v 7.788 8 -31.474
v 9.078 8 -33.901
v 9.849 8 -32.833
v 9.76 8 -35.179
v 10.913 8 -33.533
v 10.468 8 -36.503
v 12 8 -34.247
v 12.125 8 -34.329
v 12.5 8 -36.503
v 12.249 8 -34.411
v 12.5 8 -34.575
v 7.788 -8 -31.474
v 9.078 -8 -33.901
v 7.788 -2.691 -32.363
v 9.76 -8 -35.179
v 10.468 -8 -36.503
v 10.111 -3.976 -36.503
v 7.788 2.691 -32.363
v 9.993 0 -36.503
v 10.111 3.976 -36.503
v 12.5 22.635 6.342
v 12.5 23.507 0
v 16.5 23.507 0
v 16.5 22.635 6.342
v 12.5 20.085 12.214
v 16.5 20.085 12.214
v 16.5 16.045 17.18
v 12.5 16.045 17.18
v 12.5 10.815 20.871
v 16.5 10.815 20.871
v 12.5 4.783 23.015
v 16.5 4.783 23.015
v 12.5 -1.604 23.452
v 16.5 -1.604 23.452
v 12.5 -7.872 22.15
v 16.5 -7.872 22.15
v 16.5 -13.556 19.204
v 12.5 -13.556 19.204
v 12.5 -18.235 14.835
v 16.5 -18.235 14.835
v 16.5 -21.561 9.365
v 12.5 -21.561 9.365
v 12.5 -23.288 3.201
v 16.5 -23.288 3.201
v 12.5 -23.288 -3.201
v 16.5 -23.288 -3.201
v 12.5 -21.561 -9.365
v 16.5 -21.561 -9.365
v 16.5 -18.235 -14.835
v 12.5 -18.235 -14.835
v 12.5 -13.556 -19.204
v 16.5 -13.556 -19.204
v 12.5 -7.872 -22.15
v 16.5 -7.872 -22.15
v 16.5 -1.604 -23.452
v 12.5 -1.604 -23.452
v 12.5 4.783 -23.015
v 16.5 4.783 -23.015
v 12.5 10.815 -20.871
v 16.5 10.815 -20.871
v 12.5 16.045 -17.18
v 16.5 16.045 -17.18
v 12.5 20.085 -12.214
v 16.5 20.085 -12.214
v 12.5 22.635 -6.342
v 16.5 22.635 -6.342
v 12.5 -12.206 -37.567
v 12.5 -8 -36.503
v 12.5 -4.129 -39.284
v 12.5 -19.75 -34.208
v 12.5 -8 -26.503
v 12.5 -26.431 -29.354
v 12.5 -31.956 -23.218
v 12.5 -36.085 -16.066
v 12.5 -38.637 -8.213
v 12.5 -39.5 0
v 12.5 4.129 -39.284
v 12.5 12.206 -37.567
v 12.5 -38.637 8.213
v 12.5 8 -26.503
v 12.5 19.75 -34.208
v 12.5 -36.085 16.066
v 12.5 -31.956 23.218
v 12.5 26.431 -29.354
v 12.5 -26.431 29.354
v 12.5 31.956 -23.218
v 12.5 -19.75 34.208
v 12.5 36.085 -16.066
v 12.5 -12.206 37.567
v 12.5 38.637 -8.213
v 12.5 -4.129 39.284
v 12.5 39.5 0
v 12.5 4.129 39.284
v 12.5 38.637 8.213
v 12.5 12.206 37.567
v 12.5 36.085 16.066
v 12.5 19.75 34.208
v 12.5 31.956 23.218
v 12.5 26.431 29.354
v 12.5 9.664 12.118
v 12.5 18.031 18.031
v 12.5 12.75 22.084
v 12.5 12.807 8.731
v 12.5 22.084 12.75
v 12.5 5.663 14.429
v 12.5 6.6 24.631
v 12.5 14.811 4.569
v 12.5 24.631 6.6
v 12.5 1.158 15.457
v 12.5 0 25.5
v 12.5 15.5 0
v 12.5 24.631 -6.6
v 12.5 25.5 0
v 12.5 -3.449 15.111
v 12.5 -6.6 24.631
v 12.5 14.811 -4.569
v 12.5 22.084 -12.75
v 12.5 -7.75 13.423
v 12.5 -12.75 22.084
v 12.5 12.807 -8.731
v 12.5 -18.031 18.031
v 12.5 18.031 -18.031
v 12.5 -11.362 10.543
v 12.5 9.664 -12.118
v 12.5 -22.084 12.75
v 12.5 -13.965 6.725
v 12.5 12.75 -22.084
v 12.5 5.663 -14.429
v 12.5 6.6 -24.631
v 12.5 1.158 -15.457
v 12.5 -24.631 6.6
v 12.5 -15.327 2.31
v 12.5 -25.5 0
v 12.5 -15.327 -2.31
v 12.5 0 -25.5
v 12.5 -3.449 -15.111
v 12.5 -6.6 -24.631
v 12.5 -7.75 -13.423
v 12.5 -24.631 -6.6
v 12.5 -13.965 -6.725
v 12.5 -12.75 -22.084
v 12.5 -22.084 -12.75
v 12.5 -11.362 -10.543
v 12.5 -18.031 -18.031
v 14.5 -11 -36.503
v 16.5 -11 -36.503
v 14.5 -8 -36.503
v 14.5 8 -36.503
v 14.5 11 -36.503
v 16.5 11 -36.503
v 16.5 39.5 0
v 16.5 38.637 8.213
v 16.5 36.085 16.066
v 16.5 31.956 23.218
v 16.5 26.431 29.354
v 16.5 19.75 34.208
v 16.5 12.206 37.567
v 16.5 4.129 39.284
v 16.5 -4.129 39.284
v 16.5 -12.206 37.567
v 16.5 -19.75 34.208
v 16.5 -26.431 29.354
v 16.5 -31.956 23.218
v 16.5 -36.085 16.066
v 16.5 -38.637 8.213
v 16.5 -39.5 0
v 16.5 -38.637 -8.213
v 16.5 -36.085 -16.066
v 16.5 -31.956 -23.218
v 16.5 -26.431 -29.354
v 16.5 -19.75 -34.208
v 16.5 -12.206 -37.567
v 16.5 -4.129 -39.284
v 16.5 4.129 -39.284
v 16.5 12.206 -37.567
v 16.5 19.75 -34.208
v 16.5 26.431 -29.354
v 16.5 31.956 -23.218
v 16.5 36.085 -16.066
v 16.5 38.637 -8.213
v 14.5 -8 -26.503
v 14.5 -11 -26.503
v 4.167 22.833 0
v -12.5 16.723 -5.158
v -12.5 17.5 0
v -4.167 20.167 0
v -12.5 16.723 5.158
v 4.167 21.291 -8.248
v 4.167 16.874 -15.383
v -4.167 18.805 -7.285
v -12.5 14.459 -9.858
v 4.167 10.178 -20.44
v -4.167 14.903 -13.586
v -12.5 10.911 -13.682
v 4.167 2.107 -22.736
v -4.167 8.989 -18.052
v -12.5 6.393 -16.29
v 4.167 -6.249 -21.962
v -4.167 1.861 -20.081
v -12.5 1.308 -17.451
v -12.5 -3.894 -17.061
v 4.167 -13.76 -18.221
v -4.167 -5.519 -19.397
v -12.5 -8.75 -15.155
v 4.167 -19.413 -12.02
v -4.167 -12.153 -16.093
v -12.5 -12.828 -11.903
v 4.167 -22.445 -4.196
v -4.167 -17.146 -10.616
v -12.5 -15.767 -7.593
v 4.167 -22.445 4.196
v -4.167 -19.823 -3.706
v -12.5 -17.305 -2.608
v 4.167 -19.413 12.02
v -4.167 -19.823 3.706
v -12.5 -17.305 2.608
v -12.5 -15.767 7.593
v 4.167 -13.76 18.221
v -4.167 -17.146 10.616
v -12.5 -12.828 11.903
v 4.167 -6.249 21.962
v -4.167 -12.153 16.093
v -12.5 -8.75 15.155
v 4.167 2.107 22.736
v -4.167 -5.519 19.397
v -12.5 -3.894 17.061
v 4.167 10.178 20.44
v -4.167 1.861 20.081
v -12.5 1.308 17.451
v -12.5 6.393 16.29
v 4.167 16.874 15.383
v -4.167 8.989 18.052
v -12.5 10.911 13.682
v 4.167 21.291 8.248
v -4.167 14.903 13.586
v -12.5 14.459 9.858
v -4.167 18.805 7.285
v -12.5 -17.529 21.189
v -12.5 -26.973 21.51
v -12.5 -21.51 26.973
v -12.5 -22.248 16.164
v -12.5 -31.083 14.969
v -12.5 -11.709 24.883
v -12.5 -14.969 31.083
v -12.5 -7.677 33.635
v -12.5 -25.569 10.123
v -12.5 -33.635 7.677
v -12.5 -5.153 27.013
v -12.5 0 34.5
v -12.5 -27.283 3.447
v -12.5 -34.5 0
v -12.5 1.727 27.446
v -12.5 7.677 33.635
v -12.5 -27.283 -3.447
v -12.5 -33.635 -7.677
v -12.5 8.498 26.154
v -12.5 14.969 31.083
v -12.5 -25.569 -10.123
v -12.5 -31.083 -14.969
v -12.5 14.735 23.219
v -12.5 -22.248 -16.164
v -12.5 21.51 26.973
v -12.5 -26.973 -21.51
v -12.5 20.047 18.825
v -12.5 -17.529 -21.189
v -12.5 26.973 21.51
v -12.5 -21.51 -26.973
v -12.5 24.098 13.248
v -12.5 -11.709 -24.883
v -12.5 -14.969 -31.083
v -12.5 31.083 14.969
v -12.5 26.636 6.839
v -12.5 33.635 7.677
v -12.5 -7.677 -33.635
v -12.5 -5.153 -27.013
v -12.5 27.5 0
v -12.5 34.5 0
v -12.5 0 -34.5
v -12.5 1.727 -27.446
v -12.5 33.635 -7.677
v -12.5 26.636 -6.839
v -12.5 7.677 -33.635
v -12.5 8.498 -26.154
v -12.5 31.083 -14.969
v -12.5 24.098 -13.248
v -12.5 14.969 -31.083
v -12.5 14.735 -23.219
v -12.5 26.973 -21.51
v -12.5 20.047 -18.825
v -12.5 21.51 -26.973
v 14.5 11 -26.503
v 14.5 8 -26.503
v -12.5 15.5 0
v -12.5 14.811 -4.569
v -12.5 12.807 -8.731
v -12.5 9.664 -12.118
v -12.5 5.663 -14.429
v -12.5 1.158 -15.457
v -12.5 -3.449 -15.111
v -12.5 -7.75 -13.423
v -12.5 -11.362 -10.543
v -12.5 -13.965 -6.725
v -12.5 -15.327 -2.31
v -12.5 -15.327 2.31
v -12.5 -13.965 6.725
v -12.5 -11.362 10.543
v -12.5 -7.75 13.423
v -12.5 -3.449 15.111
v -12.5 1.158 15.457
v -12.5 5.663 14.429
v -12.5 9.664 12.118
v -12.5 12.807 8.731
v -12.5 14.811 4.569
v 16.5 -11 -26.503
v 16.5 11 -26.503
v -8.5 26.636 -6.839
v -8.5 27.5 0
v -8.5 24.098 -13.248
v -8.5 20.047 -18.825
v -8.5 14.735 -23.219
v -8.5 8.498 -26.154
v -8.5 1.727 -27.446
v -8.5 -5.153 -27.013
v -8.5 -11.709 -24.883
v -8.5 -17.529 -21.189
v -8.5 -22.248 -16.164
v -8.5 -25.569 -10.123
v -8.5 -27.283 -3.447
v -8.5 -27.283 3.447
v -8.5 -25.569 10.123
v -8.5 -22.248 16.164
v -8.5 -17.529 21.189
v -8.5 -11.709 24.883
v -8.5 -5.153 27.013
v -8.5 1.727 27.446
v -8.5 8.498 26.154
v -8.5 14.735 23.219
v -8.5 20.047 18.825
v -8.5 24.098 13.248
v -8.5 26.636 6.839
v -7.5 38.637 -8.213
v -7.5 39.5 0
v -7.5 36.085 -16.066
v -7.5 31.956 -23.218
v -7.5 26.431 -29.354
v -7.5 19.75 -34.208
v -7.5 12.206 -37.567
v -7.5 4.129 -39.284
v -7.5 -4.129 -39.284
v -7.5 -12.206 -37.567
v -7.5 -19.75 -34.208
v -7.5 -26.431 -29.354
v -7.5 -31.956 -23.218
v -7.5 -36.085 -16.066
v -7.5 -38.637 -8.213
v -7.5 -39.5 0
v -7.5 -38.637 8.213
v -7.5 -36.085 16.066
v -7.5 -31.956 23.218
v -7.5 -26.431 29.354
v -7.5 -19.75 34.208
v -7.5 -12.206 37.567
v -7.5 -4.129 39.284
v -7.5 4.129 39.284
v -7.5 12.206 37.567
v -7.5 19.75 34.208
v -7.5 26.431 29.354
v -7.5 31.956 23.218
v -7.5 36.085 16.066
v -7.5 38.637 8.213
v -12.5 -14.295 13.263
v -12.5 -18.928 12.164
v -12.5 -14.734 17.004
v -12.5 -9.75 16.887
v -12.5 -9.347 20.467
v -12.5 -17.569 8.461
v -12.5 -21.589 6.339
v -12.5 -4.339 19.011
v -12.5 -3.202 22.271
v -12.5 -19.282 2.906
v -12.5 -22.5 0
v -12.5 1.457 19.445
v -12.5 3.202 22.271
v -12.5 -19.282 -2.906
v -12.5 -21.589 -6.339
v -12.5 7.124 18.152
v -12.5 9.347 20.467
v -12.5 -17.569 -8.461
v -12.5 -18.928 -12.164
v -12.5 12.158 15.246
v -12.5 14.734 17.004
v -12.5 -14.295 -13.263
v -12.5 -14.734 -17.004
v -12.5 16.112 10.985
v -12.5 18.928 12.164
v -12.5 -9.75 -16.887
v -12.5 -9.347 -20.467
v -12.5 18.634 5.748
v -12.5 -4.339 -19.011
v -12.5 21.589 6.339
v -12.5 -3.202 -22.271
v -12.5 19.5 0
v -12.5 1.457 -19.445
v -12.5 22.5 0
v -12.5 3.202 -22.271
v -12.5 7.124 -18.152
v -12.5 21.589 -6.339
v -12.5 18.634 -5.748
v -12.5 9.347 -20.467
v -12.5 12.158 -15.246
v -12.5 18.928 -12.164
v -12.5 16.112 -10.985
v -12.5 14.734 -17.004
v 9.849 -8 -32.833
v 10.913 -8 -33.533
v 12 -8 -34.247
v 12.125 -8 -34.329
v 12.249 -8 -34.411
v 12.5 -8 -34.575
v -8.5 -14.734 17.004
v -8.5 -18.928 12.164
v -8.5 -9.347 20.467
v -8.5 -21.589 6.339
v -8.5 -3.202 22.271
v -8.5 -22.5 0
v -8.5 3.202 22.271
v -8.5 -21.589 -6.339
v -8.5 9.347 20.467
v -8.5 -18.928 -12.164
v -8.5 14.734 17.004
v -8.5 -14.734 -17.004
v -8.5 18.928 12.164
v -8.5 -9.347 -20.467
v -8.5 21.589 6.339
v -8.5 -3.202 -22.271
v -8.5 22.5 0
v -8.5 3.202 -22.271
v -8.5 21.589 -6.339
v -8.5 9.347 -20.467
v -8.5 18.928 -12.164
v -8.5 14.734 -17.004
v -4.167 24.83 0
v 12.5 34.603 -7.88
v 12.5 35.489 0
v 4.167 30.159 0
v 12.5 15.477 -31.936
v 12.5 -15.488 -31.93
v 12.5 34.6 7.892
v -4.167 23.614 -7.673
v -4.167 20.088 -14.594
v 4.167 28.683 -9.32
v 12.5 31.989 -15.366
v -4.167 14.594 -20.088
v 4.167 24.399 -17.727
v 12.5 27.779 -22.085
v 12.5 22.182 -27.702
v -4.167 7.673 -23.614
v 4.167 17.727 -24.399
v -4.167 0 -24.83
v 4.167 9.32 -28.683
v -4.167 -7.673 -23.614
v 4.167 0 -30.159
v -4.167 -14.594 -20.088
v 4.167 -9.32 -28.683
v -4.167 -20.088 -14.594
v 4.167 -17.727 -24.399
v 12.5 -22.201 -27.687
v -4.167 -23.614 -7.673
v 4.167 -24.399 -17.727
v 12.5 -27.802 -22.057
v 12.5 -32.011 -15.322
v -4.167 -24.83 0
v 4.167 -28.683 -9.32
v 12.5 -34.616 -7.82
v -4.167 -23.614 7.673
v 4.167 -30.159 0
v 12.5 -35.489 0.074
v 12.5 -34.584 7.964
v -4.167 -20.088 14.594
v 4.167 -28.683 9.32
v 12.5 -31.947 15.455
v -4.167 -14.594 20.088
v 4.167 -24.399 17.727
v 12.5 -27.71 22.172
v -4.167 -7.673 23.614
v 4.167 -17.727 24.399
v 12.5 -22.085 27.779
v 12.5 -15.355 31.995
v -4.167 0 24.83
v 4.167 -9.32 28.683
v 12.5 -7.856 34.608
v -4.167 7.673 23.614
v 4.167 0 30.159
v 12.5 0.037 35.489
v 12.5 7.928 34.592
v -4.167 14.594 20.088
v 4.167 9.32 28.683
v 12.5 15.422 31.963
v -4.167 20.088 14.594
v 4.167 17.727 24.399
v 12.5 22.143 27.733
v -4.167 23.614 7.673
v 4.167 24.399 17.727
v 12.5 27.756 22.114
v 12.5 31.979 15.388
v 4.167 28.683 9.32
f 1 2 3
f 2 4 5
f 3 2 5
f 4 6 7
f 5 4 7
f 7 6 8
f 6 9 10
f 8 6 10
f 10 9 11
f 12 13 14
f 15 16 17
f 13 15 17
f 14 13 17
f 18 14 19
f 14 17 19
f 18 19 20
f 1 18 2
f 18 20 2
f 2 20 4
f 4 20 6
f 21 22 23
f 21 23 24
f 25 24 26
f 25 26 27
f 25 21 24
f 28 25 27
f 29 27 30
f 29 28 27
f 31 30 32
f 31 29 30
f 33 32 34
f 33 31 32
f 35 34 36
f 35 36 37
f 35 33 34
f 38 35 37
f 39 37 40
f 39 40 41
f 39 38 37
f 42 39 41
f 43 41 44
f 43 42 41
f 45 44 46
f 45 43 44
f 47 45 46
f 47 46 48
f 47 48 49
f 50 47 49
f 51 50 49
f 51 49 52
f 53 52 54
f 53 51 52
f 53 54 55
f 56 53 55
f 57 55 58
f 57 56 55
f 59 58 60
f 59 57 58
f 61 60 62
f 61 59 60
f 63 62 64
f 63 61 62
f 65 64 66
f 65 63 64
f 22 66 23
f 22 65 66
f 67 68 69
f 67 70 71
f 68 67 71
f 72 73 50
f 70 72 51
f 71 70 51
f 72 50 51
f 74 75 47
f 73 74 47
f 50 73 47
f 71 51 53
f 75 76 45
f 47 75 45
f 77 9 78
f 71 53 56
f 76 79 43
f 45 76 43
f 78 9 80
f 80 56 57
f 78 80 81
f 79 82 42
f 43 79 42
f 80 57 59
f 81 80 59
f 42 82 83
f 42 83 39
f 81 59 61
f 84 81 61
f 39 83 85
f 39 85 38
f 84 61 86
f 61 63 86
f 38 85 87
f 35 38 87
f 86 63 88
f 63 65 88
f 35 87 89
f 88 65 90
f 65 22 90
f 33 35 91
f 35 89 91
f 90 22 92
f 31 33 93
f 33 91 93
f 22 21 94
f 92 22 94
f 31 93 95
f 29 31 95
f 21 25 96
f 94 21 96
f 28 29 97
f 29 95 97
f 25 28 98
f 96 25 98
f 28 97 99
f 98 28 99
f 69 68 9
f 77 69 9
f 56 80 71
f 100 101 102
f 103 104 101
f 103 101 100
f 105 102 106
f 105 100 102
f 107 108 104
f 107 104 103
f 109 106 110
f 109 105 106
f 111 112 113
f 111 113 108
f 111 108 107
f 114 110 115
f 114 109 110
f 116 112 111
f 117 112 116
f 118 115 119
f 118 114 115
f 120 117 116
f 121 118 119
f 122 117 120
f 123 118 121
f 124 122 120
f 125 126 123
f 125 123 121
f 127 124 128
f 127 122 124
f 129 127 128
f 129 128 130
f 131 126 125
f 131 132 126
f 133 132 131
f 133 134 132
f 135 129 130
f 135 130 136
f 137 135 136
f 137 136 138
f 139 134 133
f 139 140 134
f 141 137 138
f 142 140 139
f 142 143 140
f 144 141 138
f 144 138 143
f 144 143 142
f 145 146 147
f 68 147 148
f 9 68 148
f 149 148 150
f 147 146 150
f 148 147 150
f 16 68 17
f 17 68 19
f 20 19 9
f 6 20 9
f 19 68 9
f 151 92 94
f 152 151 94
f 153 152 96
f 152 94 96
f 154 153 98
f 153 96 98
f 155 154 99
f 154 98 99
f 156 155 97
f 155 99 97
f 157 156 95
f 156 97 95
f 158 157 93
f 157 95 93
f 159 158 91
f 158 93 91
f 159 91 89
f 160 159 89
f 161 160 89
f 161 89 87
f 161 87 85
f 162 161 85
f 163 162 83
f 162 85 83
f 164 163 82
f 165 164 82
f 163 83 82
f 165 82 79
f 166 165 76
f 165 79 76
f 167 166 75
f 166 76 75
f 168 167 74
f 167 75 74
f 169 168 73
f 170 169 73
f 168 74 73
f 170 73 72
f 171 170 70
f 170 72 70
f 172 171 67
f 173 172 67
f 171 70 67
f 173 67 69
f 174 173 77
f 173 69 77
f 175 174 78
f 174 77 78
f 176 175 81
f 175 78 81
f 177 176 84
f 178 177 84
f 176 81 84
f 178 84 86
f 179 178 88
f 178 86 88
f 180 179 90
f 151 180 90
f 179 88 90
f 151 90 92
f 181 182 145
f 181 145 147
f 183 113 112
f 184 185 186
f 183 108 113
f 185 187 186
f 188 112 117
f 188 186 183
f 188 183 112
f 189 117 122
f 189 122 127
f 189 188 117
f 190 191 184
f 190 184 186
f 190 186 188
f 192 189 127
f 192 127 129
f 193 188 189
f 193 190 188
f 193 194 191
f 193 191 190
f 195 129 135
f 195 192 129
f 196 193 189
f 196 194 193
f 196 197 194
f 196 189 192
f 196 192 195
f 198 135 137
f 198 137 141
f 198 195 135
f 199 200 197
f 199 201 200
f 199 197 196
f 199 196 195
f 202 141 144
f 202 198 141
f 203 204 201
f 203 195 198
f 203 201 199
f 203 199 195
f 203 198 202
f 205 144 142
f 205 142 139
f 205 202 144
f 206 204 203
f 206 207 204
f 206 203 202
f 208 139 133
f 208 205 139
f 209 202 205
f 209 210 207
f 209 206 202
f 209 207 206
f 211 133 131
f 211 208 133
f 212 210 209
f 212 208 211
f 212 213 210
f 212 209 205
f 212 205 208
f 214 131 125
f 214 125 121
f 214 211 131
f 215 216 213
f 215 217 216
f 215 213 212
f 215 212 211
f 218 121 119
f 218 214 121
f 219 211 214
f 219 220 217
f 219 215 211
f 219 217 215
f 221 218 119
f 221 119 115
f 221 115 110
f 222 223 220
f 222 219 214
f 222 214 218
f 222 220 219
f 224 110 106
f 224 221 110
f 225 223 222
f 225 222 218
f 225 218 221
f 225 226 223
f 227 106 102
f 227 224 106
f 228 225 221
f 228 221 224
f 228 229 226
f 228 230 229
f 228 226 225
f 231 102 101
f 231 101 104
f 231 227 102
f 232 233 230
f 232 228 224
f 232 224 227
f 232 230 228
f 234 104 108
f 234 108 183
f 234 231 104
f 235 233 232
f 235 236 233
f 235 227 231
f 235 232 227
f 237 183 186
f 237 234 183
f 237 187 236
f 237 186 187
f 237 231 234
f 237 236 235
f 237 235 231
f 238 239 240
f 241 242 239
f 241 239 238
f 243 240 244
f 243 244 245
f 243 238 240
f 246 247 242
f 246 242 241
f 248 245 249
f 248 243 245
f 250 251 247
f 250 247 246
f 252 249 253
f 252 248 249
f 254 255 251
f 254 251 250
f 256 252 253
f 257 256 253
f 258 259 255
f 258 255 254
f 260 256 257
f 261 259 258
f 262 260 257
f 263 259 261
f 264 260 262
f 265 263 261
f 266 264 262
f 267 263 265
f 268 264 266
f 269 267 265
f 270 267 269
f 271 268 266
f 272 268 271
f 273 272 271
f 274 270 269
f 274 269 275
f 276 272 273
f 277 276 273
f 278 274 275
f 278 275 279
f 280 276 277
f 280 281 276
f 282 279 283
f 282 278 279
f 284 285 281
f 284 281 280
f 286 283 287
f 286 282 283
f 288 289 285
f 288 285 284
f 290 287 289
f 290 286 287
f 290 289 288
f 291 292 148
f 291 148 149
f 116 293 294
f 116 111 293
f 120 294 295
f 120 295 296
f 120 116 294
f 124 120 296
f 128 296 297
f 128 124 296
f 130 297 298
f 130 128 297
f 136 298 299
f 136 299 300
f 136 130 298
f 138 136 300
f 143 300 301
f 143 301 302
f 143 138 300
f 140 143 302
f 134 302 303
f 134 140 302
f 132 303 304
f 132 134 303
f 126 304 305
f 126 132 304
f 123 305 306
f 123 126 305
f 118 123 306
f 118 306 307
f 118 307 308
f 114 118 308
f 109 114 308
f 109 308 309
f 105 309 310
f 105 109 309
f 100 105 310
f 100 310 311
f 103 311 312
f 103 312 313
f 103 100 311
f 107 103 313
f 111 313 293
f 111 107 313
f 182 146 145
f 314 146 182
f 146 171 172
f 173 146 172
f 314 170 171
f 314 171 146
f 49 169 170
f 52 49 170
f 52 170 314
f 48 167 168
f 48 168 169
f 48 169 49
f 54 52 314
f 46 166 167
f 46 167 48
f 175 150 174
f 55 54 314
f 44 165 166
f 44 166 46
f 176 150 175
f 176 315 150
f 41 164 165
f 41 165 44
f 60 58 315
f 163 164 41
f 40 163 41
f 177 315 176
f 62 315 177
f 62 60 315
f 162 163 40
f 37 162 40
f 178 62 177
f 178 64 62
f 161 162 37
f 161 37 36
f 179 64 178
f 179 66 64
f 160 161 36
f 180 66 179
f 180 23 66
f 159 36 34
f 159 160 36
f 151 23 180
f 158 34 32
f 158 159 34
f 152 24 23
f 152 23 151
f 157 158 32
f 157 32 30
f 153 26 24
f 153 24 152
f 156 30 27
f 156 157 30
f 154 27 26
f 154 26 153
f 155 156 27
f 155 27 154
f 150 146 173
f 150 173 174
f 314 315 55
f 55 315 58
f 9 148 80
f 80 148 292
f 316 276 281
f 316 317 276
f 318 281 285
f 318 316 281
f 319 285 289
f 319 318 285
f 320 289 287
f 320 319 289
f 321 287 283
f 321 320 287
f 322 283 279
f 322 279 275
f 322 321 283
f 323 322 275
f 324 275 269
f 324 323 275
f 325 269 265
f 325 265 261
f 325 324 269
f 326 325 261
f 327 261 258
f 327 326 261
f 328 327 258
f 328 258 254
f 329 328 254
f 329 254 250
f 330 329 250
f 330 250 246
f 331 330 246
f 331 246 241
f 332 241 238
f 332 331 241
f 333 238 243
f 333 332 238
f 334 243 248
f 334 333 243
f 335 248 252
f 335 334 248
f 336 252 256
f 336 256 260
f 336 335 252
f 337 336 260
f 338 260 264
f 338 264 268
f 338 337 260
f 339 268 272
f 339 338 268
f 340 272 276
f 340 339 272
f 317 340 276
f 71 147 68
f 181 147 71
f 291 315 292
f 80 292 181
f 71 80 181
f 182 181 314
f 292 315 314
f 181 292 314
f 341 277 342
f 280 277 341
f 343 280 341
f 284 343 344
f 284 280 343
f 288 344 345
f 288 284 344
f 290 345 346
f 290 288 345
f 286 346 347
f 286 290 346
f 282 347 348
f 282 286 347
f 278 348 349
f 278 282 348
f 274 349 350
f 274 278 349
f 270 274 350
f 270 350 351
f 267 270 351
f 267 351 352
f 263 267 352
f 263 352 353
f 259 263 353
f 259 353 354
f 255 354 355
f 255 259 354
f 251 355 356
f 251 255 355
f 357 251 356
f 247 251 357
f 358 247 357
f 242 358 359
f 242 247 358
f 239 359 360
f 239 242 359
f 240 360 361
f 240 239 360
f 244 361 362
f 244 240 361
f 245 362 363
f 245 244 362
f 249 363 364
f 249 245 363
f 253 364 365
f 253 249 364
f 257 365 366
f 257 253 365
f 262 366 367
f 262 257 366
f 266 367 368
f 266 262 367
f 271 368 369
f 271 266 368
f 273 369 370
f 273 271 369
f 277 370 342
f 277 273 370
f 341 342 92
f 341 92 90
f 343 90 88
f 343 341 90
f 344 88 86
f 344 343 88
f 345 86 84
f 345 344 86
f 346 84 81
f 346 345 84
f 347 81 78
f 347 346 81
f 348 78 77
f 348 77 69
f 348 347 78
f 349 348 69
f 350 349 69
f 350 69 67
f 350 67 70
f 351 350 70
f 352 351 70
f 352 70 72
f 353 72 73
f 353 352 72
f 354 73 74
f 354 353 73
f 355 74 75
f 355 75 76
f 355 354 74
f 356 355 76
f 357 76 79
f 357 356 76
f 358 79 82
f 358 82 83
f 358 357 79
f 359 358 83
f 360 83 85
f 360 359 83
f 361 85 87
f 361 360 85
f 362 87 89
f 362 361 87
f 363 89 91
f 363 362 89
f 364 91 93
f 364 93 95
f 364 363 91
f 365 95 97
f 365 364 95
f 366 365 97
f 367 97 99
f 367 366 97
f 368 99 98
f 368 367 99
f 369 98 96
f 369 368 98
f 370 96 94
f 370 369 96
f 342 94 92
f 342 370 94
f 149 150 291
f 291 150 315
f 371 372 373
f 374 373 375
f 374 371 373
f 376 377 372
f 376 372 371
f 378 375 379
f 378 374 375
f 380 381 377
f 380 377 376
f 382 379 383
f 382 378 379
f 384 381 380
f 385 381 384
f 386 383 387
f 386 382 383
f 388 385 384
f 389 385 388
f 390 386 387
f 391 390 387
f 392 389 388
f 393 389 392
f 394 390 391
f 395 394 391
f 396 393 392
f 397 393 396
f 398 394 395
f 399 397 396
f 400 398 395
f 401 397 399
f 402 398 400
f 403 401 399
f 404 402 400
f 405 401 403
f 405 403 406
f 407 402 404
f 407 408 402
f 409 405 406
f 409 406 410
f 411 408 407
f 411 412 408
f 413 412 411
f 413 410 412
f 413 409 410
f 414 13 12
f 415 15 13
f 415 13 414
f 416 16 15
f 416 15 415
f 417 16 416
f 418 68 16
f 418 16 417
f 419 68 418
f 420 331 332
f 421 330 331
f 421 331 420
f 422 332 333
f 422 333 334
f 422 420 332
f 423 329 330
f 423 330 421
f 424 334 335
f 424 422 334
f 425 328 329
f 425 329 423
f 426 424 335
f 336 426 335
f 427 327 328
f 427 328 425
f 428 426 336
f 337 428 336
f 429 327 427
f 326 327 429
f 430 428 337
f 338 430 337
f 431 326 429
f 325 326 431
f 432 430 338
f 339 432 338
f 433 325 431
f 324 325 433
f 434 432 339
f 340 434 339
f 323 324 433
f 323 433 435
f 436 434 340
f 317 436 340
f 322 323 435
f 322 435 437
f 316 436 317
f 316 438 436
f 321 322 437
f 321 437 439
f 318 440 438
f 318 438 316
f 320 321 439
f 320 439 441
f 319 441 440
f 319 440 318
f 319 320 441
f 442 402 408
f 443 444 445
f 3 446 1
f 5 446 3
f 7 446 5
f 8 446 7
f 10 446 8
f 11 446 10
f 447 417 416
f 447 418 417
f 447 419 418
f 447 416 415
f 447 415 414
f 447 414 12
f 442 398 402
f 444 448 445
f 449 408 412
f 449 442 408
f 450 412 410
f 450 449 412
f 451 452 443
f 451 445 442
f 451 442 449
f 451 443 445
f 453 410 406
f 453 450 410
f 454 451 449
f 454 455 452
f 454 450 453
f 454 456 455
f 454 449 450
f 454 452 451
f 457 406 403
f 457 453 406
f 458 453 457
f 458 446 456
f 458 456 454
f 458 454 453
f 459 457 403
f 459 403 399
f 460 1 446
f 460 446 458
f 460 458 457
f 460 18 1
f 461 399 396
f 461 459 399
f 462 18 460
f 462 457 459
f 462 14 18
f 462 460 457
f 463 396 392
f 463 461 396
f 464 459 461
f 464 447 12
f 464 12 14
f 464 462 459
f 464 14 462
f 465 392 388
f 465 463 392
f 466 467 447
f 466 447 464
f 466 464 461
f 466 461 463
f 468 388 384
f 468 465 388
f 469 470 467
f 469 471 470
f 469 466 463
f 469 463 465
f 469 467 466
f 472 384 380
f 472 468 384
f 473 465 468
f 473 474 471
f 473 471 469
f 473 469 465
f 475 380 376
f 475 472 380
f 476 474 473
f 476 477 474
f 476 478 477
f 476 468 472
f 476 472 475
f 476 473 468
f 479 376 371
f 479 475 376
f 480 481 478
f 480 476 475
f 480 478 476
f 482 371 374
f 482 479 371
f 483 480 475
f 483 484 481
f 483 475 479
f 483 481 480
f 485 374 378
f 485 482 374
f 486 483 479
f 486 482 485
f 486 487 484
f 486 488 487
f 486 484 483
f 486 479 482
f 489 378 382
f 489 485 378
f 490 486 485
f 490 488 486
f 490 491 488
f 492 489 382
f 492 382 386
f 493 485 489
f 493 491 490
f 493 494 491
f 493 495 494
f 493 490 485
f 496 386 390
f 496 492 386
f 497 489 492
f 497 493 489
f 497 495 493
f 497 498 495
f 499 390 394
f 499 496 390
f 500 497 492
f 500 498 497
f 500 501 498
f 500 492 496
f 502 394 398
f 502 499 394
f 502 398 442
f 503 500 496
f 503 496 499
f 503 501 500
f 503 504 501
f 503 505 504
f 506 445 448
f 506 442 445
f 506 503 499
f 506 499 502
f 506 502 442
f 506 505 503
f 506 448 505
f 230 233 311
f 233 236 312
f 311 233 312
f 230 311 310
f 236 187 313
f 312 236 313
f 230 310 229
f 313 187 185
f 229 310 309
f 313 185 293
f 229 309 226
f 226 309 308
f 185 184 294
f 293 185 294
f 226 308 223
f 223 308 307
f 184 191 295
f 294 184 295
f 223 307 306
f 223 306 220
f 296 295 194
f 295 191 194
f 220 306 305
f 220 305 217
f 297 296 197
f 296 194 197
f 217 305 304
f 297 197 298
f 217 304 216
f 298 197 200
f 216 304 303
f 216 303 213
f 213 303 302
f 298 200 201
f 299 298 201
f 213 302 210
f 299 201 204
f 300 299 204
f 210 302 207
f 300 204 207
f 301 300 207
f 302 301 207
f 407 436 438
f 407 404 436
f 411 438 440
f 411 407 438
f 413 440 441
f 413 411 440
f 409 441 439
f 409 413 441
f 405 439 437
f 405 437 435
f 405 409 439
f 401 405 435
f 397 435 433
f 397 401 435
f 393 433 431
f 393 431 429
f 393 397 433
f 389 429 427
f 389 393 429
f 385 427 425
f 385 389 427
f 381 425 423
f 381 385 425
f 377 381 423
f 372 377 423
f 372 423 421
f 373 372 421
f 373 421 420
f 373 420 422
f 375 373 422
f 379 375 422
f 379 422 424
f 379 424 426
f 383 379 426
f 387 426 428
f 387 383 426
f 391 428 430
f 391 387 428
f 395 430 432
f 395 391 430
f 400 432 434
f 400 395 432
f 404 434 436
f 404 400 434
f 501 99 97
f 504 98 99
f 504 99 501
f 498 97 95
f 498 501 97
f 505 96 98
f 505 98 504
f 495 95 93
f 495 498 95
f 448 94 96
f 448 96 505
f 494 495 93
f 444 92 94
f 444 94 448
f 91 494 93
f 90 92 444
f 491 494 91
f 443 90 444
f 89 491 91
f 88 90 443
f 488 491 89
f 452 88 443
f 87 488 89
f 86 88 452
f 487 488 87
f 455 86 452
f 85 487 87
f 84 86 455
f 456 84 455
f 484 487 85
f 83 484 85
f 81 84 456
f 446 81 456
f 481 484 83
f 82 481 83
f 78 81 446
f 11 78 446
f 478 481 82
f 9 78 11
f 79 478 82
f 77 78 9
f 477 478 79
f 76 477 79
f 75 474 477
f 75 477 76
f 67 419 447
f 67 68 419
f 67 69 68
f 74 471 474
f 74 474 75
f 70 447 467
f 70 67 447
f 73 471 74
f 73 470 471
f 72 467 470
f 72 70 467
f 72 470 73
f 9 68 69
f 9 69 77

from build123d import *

# Parameters (mm, degrees)
F0_W        = 25
F0_H        = 2
F2_SIZE     = 5
F3_R        = 39.5
F3_R_2      = 23.5068353711
F4_DEPTH    = 4
F5_W        = 8
F5_H        = 10
F6_DEPTH    = 4.5
F5_W_2      = 3
F7_DEPTH    = 2
F8_T4_ANGLE = 68.4635032376


# Not quite as in the source:
# - a fillet or chamfer that OpenCascade refuses, or shapes differently, is made with other operations: its cross-section is extruded or revolved along the edge and cut away or added


with BuildPart() as f1:
    # F0 (on Top) → F1 (revolve)
    with BuildSketch(Plane.XY):
        with Locations((0, 16.5)):
            Rectangle(F0_W, F0_H)
        Polygon((12.5, 25.5), (-12.5, 17.5), (12.5, 17.5), align=None)
    revolve(axis=Axis((0, 0, 0), (-1, 0, 0)))


with BuildPart() as f1b:
    # F0 (on Top) → F1, piece 2 (revolve)
    with BuildSketch(Plane.XY):
        Polygon((-12.5, 22.5), (-12.5, 19.5), (12.5, 35.4886714636), (12.5, 39.5), (-12.5, 39.5), (-12.5, 27.5), (-8.5, 27.5), (-8.5, 22.5), align=None)
    revolve(axis=Axis((0, 0, 0), (-1, 0, 0)))

    # F2
    f2_edges = [f1b.edges().sort_by_distance(p)[0] for p in [
        (-12.5, -39.5, 0),
    ]]
    chamfer(f2_edges, length=F2_SIZE)


with BuildPart() as f4:
    # F3 (on face) → F4 (new body)
    with BuildSketch(Plane.YZ.offset(12.5)):
        Circle(F3_R)
        Circle(F3_R_2, mode=Mode.SUBTRACT)
    extrude(amount=F4_DEPTH)


with BuildPart() as f6_tool:
    # F5 (on face) → F6 (new body)
    with BuildSketch(Plane.YZ.offset(16.5)):
        with Locations((-4, -31.5034176856)):
            Rectangle(F5_W, F5_H)
        with Locations((4, -31.5034176856)):
            Rectangle(F5_W, F5_H)
    extrude(amount=-F6_DEPTH)


with BuildPart() as f1b_1:
    add(f1b.part)

    # F6: cut by f6_tool
    add(f6_tool.part, mode=Mode.SUBTRACT)

    # F8: chamfer of 5 on 1 edges, made by hand


with BuildPart() as f4_1:
    add(f4.part)

    # F6: cut by f6_tool
    add(f6_tool.part, mode=Mode.SUBTRACT)

    # F5 (on face) → F7 (cut)
    with BuildSketch(Plane.YZ.offset(16.5)):
        with Locations((-9.5, -31.5034176856)):
            Rectangle(F5_W_2, F5_H)
        with Locations((9.5, -31.5034176856)):
            Rectangle(F5_W_2, F5_H)
    extrude(amount=-F7_DEPTH, mode=Mode.SUBTRACT)


with BuildPart() as f8_tool2:
    # F8_s3 → F8_t4 (revolve)
    with BuildSketch(Plane(origin=(0, 0, 0), x_dir=(1, 0, 0), z_dir=(0, -0.8267689574, 0.562541635))):
        Polygon((7.7877765933, -32.474983787), (12, -40.1688980343), (12, -35.1688980343), align=None)
    revolve(axis=Axis((12, 0, 0), (1, 0, 0)), revolution_arc=F8_T4_ANGLE)

    split(bisect_by=Plane.XZ.offset(8), keep=Keep.BOTTOM)

    split(bisect_by=Plane.XY.offset(-36.5034176856), keep=Keep.TOP)

    split(bisect_by=Plane.XZ.offset(-8), keep=Keep.TOP)


with BuildPart() as f1b_2:
    add(f1b_1.part)

    # F8_t1: cut F8_tool2
    add(f8_tool2.part, mode=Mode.SUBTRACT)


solid = Compound([f1.part, f4_1.part, f1b_2.part])
